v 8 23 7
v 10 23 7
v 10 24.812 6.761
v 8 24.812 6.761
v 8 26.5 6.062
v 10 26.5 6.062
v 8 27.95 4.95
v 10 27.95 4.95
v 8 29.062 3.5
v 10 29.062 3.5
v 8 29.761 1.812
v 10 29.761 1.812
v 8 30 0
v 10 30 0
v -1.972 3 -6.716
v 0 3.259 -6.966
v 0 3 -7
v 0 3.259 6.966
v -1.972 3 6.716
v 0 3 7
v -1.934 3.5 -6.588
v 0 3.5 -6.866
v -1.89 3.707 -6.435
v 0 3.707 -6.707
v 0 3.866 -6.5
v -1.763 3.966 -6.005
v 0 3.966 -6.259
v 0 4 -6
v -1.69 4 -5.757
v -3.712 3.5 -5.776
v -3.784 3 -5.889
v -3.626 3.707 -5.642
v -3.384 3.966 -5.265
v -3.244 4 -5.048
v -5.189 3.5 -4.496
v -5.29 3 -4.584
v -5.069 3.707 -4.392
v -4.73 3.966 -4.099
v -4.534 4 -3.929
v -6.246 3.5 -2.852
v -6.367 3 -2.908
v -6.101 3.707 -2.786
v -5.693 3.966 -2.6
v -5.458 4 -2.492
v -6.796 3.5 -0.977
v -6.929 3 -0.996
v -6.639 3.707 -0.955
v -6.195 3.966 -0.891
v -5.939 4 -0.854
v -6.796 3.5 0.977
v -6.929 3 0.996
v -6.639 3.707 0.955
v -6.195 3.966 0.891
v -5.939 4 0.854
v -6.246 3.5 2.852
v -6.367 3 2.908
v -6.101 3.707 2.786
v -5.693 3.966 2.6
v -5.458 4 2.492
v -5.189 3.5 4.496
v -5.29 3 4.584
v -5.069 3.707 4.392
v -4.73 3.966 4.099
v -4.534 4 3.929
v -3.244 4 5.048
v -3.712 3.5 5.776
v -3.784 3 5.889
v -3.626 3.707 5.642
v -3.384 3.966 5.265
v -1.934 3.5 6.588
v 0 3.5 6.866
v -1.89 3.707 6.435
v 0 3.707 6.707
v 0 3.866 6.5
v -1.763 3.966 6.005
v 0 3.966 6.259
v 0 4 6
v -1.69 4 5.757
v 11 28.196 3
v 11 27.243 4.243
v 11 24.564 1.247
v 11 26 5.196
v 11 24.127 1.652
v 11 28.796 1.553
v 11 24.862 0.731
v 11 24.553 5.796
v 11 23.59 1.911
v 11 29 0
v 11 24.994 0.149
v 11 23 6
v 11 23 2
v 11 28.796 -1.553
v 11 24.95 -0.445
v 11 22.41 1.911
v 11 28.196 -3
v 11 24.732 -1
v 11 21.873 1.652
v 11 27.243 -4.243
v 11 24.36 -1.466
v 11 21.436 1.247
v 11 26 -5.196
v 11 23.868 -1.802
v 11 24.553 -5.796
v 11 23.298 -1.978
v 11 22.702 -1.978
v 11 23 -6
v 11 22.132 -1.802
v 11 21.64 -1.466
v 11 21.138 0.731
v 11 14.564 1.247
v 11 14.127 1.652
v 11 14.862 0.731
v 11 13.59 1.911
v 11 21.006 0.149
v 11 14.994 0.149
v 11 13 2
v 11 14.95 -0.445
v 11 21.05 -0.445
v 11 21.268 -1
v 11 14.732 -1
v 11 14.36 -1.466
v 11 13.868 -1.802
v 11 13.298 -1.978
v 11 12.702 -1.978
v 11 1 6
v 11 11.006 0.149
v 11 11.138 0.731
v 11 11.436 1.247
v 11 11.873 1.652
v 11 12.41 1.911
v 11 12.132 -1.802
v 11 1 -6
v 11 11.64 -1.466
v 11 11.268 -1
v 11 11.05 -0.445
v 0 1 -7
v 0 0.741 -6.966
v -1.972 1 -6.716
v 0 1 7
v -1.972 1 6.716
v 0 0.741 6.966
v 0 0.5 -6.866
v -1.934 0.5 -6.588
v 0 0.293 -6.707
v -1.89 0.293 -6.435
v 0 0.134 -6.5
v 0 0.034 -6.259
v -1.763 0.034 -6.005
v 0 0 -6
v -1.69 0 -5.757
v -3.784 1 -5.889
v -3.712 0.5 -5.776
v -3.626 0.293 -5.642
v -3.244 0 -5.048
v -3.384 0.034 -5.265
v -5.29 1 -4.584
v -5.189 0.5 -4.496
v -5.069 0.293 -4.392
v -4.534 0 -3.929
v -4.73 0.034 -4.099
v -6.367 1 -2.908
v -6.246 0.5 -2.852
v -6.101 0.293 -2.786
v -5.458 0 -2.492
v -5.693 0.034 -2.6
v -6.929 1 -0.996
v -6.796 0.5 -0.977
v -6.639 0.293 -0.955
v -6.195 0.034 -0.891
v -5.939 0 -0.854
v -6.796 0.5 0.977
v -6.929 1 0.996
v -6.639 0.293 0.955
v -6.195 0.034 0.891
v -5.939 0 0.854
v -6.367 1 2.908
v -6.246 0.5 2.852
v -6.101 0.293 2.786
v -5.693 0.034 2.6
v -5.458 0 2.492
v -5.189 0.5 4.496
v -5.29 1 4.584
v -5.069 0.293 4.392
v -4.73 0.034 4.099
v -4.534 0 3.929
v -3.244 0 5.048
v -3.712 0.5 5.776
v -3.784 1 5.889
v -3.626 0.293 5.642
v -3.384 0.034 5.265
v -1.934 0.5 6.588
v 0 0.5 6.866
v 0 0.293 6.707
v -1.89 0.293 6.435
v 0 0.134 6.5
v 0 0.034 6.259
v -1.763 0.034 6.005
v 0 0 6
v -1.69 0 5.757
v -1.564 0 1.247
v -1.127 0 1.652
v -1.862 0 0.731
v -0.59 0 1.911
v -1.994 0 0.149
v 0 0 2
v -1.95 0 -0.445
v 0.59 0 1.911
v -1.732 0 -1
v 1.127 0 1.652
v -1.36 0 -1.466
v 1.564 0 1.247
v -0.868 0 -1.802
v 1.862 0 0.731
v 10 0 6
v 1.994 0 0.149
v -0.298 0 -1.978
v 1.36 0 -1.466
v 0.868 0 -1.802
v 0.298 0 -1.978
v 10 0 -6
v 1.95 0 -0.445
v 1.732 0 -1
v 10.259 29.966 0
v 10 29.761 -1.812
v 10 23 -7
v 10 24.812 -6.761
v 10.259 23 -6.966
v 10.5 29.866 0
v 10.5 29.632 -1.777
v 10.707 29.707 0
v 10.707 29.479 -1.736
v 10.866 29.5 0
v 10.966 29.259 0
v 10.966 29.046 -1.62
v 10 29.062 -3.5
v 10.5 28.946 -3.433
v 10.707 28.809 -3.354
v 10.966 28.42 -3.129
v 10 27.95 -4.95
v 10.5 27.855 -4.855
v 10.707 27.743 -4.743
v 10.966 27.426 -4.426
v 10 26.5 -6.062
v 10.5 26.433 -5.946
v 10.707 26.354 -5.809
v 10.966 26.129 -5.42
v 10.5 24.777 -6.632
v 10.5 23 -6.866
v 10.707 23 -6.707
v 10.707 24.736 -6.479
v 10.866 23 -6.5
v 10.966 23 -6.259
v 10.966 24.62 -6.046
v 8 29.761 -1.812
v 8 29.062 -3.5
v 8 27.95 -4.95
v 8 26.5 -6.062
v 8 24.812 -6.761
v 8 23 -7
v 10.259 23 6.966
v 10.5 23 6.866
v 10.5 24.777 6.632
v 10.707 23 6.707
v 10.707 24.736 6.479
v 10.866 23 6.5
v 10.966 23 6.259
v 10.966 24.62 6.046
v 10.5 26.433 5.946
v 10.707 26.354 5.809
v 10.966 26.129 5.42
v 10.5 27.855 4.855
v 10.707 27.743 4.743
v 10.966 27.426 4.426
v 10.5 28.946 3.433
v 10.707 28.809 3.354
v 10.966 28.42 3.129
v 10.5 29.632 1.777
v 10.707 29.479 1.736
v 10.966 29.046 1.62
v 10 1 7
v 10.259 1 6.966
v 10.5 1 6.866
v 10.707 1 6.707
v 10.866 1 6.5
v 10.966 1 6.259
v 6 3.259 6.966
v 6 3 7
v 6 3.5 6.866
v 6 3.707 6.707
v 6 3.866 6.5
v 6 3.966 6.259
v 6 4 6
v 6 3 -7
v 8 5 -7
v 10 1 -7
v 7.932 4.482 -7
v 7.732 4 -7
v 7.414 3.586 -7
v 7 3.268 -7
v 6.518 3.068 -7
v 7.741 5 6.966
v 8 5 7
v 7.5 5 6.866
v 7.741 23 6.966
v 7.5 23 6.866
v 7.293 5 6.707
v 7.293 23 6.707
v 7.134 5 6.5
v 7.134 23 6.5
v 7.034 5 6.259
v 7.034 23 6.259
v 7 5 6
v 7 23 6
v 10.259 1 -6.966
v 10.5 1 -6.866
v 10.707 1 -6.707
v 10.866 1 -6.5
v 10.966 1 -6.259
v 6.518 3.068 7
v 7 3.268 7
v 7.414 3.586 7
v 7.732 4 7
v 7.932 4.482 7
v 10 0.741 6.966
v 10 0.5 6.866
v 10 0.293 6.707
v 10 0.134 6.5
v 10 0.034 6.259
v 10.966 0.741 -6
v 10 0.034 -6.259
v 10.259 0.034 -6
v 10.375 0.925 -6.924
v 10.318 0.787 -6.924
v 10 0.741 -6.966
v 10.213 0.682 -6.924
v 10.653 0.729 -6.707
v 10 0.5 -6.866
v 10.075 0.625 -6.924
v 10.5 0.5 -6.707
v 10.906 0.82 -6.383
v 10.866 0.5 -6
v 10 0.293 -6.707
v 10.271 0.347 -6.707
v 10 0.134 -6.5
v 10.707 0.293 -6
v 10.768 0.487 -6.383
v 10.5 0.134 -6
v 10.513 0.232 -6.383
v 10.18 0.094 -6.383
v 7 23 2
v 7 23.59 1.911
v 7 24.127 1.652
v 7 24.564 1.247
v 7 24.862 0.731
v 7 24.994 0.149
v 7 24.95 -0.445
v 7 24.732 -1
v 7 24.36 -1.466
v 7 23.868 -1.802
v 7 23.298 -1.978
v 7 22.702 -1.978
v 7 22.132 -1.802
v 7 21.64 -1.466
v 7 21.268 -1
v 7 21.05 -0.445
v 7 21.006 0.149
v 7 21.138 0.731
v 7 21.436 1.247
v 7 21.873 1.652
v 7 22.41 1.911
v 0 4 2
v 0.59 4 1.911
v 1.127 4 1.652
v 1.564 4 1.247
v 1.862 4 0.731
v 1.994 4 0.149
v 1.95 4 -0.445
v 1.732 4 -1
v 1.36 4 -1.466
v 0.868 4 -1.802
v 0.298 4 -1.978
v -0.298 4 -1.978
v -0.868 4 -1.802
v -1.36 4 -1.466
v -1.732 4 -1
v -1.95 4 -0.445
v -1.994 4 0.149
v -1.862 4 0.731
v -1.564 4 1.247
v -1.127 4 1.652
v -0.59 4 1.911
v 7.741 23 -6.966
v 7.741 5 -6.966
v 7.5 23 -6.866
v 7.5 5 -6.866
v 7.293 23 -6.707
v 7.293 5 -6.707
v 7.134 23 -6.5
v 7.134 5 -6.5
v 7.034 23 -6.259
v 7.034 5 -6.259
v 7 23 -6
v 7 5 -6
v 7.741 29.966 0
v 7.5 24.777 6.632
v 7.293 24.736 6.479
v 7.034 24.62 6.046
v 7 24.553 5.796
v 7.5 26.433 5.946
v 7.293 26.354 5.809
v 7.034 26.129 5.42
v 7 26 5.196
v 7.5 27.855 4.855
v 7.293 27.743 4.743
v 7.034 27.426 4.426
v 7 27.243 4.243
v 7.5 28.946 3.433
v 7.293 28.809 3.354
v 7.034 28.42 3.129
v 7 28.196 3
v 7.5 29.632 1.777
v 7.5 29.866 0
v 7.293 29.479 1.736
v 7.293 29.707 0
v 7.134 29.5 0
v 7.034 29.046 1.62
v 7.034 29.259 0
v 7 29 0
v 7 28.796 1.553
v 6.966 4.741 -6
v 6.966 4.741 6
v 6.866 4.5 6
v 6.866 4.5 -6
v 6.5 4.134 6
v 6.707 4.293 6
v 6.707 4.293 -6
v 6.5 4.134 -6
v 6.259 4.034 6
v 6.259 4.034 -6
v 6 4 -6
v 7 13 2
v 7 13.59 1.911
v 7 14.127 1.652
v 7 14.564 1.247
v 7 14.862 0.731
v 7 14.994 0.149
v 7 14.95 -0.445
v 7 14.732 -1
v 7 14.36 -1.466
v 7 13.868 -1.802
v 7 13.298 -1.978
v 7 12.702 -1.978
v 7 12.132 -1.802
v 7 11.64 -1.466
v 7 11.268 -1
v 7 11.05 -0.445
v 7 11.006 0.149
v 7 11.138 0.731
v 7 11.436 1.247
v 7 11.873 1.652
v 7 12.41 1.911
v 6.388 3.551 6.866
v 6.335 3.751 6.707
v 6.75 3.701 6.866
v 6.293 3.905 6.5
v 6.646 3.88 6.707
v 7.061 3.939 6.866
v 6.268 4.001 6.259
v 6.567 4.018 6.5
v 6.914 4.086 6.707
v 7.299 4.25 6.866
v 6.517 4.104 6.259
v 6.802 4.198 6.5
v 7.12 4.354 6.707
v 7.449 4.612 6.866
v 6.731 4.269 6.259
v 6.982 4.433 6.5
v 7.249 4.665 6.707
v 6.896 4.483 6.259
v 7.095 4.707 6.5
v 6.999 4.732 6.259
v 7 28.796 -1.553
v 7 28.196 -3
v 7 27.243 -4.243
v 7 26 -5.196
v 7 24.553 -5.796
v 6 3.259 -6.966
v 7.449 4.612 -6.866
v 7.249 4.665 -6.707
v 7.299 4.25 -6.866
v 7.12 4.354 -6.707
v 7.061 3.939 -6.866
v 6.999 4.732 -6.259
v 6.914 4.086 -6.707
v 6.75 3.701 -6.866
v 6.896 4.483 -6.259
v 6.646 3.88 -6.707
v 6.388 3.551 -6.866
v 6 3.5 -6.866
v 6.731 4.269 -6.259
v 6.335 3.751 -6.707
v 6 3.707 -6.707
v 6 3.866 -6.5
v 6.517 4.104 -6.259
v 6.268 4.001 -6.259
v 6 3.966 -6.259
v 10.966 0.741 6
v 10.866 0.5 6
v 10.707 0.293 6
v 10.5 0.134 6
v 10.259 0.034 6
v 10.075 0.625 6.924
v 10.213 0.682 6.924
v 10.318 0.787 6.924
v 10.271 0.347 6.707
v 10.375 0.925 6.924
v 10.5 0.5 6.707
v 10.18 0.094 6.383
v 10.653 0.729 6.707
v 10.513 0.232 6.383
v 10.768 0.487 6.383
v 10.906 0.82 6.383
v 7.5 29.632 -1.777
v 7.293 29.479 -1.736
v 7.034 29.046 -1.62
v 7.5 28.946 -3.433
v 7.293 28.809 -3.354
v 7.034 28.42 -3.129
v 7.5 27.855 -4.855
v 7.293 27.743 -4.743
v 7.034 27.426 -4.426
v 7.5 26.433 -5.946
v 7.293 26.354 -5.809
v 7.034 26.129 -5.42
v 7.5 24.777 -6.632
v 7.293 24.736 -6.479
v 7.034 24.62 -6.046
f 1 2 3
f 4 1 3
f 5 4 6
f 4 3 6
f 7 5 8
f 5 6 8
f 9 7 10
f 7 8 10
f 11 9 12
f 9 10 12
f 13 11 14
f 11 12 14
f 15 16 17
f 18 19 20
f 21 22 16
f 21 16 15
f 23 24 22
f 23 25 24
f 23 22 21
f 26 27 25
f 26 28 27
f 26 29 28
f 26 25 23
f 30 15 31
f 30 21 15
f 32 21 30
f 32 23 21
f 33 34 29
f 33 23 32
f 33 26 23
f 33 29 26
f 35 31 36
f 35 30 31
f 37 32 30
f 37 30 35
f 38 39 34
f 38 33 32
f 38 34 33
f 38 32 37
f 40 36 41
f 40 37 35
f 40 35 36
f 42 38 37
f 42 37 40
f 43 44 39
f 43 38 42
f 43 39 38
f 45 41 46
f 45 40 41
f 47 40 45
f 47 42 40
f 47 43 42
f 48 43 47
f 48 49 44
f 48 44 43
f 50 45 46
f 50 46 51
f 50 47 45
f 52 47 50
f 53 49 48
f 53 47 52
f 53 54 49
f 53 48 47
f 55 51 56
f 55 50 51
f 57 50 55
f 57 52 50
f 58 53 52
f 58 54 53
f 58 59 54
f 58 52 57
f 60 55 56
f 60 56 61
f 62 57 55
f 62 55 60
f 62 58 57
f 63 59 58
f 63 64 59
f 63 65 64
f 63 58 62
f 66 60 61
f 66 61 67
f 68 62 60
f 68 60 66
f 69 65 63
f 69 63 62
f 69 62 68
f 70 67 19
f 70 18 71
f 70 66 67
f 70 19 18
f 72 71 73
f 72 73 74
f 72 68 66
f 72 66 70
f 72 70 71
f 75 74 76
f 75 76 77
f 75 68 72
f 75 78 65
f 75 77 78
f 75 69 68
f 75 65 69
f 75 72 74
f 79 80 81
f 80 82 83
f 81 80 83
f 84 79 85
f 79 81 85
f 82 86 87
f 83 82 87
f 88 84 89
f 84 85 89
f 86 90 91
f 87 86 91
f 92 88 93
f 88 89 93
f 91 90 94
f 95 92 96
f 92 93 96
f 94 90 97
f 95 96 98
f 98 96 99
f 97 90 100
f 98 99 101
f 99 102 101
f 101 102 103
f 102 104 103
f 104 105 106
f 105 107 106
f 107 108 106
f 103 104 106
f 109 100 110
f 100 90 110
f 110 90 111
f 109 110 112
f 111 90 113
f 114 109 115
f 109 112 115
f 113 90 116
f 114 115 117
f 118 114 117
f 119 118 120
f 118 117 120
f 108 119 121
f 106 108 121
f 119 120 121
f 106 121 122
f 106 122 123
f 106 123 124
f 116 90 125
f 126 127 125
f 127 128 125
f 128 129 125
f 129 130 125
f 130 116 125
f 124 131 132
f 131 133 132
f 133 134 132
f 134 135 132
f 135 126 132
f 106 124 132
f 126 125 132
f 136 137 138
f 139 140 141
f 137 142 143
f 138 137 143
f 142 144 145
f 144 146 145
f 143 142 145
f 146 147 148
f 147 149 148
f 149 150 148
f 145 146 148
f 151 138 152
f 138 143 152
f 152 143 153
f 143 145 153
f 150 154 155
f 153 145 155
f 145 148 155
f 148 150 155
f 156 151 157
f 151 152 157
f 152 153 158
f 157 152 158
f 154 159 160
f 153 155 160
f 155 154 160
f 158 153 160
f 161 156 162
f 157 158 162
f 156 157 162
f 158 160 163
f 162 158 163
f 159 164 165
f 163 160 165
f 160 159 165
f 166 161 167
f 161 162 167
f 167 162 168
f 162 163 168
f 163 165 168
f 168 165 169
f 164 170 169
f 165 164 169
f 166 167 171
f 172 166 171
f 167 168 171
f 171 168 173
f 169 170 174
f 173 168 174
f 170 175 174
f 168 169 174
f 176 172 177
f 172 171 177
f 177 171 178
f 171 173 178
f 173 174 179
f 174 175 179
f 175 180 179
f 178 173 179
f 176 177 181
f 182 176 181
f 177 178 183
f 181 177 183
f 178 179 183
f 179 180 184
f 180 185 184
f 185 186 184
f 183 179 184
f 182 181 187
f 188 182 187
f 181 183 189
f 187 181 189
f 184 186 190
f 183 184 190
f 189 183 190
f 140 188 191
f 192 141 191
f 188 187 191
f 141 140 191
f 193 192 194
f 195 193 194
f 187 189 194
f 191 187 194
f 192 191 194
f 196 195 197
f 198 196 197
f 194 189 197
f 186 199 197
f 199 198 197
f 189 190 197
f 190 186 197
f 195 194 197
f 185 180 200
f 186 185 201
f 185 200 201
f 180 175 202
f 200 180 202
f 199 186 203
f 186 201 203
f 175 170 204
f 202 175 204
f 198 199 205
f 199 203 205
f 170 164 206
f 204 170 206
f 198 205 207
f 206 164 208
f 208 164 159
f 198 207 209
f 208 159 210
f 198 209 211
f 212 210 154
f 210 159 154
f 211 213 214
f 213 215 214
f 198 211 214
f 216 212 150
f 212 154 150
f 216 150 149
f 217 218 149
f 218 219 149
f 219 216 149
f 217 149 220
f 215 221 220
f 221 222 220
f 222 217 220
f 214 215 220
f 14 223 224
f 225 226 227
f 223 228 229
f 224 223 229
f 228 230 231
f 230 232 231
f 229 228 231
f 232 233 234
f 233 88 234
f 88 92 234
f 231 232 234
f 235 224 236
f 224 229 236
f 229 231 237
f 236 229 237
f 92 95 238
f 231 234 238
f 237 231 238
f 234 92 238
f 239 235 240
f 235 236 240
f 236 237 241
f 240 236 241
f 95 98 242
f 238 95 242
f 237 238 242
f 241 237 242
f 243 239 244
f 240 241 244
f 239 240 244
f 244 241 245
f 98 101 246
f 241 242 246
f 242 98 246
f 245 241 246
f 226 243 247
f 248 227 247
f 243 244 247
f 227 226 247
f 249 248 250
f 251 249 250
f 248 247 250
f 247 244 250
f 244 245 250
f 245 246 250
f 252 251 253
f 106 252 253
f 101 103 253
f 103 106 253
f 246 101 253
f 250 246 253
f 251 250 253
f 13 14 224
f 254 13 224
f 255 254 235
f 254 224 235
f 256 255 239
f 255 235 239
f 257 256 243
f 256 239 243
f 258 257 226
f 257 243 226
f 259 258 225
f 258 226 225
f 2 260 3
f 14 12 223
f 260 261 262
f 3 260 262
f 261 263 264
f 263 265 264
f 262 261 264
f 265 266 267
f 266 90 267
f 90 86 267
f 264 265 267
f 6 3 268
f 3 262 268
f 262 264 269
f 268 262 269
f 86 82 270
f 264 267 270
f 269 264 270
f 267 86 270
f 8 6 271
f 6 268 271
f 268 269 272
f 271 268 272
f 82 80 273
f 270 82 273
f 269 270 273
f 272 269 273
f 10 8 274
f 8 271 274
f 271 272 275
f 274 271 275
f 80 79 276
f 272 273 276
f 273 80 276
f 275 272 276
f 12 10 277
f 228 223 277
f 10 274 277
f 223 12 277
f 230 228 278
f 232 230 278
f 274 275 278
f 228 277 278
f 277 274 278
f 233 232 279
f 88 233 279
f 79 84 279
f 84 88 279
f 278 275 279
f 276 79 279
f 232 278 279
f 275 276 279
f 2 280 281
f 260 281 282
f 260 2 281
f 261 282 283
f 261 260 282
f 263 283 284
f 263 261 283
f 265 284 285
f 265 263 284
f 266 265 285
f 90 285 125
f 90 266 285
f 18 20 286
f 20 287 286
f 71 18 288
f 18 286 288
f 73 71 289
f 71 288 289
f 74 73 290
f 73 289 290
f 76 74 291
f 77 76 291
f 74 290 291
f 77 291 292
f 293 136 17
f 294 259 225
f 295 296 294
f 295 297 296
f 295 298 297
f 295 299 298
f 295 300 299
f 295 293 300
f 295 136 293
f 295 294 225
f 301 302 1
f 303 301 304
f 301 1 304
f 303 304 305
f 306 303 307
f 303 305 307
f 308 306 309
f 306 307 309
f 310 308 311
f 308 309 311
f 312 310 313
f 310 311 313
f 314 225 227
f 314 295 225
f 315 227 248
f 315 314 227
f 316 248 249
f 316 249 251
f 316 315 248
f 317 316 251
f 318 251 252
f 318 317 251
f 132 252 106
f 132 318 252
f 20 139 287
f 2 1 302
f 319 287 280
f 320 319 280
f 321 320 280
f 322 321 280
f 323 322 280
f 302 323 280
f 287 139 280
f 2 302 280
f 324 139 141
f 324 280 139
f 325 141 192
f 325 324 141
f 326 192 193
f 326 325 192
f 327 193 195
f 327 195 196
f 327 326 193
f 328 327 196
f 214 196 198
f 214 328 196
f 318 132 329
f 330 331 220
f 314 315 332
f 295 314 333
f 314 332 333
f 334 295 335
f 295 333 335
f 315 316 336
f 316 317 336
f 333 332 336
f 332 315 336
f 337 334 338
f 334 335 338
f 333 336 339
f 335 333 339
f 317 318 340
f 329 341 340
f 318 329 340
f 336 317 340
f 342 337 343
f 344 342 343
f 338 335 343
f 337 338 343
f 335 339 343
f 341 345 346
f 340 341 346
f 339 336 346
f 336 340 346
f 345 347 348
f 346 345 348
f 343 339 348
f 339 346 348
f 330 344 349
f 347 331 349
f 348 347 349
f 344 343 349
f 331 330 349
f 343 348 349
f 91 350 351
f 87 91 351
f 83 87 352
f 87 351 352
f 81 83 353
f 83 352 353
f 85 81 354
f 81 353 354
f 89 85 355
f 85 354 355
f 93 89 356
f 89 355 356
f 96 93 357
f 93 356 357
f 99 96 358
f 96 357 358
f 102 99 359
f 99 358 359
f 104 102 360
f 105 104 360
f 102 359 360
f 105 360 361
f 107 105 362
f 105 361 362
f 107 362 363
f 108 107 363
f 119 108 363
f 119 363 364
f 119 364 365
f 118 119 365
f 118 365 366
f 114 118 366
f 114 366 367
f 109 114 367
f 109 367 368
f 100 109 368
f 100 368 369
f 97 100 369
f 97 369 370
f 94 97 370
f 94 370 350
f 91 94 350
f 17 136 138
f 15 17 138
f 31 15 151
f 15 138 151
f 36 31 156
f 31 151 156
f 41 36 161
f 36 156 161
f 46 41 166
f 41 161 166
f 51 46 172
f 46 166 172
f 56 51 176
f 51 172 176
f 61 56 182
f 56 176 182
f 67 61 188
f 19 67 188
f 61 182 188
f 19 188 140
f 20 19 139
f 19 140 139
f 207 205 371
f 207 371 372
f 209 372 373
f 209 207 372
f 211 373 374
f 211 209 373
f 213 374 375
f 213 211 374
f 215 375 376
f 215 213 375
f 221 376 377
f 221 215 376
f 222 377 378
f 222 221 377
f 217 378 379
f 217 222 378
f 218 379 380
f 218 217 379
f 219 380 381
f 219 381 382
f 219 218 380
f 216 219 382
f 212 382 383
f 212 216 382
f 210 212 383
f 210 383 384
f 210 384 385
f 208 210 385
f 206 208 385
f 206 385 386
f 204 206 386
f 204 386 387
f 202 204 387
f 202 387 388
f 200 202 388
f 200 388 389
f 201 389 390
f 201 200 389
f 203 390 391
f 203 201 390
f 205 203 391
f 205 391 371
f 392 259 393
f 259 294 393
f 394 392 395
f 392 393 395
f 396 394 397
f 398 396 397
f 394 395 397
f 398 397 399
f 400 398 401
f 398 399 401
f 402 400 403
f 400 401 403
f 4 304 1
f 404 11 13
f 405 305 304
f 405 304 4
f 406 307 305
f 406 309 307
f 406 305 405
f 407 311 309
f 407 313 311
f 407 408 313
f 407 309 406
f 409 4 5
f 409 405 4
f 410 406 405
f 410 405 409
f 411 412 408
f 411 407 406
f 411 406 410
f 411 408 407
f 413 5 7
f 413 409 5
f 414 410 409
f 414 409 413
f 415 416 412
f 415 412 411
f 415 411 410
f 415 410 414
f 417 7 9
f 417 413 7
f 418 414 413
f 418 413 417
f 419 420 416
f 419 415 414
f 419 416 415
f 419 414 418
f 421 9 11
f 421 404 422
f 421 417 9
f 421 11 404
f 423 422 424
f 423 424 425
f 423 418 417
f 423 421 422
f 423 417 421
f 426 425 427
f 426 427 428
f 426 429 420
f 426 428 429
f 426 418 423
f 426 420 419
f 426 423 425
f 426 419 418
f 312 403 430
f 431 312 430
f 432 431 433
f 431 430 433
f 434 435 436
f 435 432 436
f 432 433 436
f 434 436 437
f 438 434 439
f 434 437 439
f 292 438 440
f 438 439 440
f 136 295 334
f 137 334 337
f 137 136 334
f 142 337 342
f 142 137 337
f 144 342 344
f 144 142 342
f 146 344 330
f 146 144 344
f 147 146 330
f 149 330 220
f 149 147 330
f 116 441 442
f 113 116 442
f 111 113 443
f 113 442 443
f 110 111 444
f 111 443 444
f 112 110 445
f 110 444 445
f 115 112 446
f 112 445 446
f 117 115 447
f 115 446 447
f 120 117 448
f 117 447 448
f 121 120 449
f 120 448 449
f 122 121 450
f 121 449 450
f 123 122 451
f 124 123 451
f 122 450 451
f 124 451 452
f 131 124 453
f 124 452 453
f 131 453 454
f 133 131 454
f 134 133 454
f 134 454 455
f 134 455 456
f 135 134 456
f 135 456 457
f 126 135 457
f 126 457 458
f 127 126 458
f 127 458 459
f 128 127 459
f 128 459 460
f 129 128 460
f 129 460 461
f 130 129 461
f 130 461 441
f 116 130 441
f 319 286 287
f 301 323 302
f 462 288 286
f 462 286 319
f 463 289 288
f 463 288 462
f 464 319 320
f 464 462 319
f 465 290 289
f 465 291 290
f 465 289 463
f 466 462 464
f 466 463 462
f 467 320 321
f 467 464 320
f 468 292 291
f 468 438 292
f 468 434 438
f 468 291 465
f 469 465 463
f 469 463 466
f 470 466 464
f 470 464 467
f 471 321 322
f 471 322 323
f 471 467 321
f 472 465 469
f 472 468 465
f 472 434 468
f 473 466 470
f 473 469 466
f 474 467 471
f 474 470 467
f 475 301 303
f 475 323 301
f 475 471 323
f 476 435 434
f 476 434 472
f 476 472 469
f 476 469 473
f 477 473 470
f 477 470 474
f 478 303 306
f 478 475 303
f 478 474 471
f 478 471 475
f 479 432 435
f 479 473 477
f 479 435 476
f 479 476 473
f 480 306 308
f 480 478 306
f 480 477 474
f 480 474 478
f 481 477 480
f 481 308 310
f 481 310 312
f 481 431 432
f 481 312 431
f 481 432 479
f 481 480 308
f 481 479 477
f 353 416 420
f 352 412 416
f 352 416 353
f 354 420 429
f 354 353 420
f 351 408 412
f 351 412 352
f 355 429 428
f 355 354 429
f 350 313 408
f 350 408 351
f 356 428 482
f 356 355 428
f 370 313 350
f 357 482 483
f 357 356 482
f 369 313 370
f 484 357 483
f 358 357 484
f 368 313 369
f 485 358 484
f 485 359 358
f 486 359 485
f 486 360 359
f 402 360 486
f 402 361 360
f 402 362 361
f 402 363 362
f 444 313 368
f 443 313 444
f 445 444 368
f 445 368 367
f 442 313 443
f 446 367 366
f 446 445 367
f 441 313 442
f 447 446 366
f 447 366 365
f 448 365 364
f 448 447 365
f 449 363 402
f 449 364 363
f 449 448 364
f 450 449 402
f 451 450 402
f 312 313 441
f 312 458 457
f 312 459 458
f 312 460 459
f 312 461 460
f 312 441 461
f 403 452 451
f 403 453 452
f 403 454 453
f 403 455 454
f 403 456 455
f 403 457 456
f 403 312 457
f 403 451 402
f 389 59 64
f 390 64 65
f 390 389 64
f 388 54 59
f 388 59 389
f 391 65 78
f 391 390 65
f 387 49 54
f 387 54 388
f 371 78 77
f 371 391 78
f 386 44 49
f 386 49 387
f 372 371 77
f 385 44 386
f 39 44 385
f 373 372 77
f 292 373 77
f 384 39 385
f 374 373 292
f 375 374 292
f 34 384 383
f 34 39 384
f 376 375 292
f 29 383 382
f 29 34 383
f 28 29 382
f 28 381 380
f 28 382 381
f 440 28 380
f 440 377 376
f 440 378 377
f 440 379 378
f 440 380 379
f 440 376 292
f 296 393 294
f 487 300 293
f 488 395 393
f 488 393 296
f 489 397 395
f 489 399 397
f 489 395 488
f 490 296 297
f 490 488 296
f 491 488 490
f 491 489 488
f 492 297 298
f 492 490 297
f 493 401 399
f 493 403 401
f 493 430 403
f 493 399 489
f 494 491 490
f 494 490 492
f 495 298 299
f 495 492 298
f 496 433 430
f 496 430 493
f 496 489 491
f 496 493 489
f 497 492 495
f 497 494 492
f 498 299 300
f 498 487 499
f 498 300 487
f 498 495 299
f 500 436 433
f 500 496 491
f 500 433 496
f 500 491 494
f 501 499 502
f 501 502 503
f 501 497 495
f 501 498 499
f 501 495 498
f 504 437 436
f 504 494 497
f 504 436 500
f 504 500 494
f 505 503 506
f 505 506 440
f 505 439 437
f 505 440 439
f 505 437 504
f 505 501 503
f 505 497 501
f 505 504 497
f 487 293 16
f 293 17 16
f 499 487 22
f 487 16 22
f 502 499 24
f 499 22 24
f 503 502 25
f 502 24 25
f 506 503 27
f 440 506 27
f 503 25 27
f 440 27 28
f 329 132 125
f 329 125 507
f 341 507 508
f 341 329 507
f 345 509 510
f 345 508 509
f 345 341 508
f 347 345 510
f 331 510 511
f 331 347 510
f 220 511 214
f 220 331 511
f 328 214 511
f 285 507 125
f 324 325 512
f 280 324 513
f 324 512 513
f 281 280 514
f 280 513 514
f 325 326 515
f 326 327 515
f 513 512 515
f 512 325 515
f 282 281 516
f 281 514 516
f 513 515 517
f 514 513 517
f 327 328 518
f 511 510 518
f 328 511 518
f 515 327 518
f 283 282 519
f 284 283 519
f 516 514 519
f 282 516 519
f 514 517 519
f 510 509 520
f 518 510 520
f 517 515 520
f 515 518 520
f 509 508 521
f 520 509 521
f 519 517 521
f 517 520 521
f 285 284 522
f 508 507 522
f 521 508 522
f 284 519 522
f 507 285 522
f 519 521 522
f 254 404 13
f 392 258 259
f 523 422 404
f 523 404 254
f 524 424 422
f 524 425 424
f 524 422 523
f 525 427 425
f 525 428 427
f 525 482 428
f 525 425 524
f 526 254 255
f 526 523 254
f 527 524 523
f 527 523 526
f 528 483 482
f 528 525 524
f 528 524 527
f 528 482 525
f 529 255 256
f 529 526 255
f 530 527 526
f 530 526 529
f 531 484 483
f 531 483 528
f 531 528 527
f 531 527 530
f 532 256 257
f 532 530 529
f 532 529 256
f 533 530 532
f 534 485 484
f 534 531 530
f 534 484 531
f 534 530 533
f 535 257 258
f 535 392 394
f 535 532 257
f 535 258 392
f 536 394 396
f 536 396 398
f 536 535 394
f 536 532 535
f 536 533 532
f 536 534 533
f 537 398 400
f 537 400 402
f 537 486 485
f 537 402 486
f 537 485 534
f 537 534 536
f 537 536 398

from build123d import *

# Parameters (mm, degrees)
SKETCH1_R           = 7
SKETCH1_R_2         = 2
BOSS_EXTRUDE1_DEPTH = 4
SKETCH2_W           = 4
SKETCH2_H           = 14
BOSS_EXTRUDE2_DEPTH = 26
CUT_EXTRUDE2_REACH  = 35.838
SKETCH4_R           = 2
FILLET6_R           = 7
FILLET7_R           = 1
FILLET8_R           = 1


with BuildPart() as part:
    # Sketch1 → Boss-Extrude1 (new body)
    # profile 1 of 2: a face of its own
    with BuildSketch(Plane(origin=(0, 0, 0), x_dir=(1, 0, 0), z_dir=(0, 1, 0))):
        Circle(SKETCH1_R)
        with Locations(Location((0, 0, 0), (0, 0, 270))):
            Circle(SKETCH1_R_2, mode=Mode.SUBTRACT)
    # profile 2 of 2: a face of its own
    with BuildSketch(Plane(origin=(0, 0, 0), x_dir=(1, 0, 0), z_dir=(0, 1, 0))):
        with BuildLine():
            Line((11, 7), (0, 7))
            ThreePointArc((0, 7), (4.949747468, 4.949747468), (7, 0))
            ThreePointArc((7, 0), (4.949747468, -4.949747468), (0, -7))
            Line((0, -7), (11, -7))
            Line((11, -7), (11, 7))
        make_face()
    extrude(amount=BOSS_EXTRUDE1_DEPTH)

    # Sketch2 → Boss-Extrude2 (add)
    with BuildSketch(Plane(origin=(0, 4, 0), x_dir=(1, 0, 0), z_dir=(0, 1, 0))):
        with Locations((9, 0)):
            Rectangle(SKETCH2_W, SKETCH2_H)
    extrude(amount=BOSS_EXTRUDE2_DEPTH)

    # Sketch4 → Cut-Extrude2 (cut, up to next)
    with BuildSketch(Plane.ZY.offset(-7), mode=Mode.PRIVATE) as cut_extrude2_sk1:
        with Locations((0, 23)):
            Circle(SKETCH4_R)
    cut_extrude2_tool1 = extrude(cut_extrude2_sk1.sketch, amount=-CUT_EXTRUDE2_REACH, mode=Mode.PRIVATE) & part.part
    # Sketch4 → Cut-Extrude2 (cut, up to next)
    with BuildSketch(Plane.ZY.offset(-7), mode=Mode.PRIVATE) as cut_extrude2_sk2:
        with Locations((0, 13)):
            Circle(SKETCH4_R)
    cut_extrude2_tool2 = extrude(cut_extrude2_sk2.sketch, amount=-CUT_EXTRUDE2_REACH, mode=Mode.PRIVATE) & part.part
    add(cut_extrude2_tool1.solids().sort_by_distance((7, 23, 0))[0], mode=Mode.SUBTRACT)
    add(cut_extrude2_tool2.solids().sort_by_distance((7, 13, 0))[0], mode=Mode.SUBTRACT)

    # Fillet6
    fillet6_edges = [part.edges().sort_by_distance(p)[0] for p in [
        (9, 30, -7),
        (9, 30, 7),
    ]]
    fillet(fillet6_edges, radius=FILLET6_R - 0.0001)  # a hair under: the kernel refuses the full size

    # Fillet7
    fillet7_edges = [part.edges().sort_by_distance(p)[0] for p in [
        (7, 4, 0),
        (11, 0, 0),
    ]]
    fillet(fillet7_edges, radius=FILLET7_R)

    # Fillet8
    fillet8_edges = [part.edges().sort_by_distance(p)[0] for p in [
        (3, 4, -7),
        (7, 14.00005, 7),
        (7, 14.00005, -7),
        (7, 27.949776758, 4.949776758),
        (7, 27.949776758, -4.949776758),
        (11, 12.00005, -7),
        (11, 12.00005, 7),
        (11, 27.949776758, 4.949776758),
        (11, 27.949776758, -4.949776758),
        (5, 0, 7),
        (3, 4, 7),
        (10.707106781, 0.292893219, 7),
        (10.707106781, 0.292893219, -7),
        (6.707106781, 4.292893219, 7),
        (6.707106781, 4.292893219, -7),
        (5, 0, -7),
        (-7, 0, 0),
        (-7, 4, 0),
    ]]
    fillet(fillet8_edges, radius=FILLET8_R)


solid = part.part
